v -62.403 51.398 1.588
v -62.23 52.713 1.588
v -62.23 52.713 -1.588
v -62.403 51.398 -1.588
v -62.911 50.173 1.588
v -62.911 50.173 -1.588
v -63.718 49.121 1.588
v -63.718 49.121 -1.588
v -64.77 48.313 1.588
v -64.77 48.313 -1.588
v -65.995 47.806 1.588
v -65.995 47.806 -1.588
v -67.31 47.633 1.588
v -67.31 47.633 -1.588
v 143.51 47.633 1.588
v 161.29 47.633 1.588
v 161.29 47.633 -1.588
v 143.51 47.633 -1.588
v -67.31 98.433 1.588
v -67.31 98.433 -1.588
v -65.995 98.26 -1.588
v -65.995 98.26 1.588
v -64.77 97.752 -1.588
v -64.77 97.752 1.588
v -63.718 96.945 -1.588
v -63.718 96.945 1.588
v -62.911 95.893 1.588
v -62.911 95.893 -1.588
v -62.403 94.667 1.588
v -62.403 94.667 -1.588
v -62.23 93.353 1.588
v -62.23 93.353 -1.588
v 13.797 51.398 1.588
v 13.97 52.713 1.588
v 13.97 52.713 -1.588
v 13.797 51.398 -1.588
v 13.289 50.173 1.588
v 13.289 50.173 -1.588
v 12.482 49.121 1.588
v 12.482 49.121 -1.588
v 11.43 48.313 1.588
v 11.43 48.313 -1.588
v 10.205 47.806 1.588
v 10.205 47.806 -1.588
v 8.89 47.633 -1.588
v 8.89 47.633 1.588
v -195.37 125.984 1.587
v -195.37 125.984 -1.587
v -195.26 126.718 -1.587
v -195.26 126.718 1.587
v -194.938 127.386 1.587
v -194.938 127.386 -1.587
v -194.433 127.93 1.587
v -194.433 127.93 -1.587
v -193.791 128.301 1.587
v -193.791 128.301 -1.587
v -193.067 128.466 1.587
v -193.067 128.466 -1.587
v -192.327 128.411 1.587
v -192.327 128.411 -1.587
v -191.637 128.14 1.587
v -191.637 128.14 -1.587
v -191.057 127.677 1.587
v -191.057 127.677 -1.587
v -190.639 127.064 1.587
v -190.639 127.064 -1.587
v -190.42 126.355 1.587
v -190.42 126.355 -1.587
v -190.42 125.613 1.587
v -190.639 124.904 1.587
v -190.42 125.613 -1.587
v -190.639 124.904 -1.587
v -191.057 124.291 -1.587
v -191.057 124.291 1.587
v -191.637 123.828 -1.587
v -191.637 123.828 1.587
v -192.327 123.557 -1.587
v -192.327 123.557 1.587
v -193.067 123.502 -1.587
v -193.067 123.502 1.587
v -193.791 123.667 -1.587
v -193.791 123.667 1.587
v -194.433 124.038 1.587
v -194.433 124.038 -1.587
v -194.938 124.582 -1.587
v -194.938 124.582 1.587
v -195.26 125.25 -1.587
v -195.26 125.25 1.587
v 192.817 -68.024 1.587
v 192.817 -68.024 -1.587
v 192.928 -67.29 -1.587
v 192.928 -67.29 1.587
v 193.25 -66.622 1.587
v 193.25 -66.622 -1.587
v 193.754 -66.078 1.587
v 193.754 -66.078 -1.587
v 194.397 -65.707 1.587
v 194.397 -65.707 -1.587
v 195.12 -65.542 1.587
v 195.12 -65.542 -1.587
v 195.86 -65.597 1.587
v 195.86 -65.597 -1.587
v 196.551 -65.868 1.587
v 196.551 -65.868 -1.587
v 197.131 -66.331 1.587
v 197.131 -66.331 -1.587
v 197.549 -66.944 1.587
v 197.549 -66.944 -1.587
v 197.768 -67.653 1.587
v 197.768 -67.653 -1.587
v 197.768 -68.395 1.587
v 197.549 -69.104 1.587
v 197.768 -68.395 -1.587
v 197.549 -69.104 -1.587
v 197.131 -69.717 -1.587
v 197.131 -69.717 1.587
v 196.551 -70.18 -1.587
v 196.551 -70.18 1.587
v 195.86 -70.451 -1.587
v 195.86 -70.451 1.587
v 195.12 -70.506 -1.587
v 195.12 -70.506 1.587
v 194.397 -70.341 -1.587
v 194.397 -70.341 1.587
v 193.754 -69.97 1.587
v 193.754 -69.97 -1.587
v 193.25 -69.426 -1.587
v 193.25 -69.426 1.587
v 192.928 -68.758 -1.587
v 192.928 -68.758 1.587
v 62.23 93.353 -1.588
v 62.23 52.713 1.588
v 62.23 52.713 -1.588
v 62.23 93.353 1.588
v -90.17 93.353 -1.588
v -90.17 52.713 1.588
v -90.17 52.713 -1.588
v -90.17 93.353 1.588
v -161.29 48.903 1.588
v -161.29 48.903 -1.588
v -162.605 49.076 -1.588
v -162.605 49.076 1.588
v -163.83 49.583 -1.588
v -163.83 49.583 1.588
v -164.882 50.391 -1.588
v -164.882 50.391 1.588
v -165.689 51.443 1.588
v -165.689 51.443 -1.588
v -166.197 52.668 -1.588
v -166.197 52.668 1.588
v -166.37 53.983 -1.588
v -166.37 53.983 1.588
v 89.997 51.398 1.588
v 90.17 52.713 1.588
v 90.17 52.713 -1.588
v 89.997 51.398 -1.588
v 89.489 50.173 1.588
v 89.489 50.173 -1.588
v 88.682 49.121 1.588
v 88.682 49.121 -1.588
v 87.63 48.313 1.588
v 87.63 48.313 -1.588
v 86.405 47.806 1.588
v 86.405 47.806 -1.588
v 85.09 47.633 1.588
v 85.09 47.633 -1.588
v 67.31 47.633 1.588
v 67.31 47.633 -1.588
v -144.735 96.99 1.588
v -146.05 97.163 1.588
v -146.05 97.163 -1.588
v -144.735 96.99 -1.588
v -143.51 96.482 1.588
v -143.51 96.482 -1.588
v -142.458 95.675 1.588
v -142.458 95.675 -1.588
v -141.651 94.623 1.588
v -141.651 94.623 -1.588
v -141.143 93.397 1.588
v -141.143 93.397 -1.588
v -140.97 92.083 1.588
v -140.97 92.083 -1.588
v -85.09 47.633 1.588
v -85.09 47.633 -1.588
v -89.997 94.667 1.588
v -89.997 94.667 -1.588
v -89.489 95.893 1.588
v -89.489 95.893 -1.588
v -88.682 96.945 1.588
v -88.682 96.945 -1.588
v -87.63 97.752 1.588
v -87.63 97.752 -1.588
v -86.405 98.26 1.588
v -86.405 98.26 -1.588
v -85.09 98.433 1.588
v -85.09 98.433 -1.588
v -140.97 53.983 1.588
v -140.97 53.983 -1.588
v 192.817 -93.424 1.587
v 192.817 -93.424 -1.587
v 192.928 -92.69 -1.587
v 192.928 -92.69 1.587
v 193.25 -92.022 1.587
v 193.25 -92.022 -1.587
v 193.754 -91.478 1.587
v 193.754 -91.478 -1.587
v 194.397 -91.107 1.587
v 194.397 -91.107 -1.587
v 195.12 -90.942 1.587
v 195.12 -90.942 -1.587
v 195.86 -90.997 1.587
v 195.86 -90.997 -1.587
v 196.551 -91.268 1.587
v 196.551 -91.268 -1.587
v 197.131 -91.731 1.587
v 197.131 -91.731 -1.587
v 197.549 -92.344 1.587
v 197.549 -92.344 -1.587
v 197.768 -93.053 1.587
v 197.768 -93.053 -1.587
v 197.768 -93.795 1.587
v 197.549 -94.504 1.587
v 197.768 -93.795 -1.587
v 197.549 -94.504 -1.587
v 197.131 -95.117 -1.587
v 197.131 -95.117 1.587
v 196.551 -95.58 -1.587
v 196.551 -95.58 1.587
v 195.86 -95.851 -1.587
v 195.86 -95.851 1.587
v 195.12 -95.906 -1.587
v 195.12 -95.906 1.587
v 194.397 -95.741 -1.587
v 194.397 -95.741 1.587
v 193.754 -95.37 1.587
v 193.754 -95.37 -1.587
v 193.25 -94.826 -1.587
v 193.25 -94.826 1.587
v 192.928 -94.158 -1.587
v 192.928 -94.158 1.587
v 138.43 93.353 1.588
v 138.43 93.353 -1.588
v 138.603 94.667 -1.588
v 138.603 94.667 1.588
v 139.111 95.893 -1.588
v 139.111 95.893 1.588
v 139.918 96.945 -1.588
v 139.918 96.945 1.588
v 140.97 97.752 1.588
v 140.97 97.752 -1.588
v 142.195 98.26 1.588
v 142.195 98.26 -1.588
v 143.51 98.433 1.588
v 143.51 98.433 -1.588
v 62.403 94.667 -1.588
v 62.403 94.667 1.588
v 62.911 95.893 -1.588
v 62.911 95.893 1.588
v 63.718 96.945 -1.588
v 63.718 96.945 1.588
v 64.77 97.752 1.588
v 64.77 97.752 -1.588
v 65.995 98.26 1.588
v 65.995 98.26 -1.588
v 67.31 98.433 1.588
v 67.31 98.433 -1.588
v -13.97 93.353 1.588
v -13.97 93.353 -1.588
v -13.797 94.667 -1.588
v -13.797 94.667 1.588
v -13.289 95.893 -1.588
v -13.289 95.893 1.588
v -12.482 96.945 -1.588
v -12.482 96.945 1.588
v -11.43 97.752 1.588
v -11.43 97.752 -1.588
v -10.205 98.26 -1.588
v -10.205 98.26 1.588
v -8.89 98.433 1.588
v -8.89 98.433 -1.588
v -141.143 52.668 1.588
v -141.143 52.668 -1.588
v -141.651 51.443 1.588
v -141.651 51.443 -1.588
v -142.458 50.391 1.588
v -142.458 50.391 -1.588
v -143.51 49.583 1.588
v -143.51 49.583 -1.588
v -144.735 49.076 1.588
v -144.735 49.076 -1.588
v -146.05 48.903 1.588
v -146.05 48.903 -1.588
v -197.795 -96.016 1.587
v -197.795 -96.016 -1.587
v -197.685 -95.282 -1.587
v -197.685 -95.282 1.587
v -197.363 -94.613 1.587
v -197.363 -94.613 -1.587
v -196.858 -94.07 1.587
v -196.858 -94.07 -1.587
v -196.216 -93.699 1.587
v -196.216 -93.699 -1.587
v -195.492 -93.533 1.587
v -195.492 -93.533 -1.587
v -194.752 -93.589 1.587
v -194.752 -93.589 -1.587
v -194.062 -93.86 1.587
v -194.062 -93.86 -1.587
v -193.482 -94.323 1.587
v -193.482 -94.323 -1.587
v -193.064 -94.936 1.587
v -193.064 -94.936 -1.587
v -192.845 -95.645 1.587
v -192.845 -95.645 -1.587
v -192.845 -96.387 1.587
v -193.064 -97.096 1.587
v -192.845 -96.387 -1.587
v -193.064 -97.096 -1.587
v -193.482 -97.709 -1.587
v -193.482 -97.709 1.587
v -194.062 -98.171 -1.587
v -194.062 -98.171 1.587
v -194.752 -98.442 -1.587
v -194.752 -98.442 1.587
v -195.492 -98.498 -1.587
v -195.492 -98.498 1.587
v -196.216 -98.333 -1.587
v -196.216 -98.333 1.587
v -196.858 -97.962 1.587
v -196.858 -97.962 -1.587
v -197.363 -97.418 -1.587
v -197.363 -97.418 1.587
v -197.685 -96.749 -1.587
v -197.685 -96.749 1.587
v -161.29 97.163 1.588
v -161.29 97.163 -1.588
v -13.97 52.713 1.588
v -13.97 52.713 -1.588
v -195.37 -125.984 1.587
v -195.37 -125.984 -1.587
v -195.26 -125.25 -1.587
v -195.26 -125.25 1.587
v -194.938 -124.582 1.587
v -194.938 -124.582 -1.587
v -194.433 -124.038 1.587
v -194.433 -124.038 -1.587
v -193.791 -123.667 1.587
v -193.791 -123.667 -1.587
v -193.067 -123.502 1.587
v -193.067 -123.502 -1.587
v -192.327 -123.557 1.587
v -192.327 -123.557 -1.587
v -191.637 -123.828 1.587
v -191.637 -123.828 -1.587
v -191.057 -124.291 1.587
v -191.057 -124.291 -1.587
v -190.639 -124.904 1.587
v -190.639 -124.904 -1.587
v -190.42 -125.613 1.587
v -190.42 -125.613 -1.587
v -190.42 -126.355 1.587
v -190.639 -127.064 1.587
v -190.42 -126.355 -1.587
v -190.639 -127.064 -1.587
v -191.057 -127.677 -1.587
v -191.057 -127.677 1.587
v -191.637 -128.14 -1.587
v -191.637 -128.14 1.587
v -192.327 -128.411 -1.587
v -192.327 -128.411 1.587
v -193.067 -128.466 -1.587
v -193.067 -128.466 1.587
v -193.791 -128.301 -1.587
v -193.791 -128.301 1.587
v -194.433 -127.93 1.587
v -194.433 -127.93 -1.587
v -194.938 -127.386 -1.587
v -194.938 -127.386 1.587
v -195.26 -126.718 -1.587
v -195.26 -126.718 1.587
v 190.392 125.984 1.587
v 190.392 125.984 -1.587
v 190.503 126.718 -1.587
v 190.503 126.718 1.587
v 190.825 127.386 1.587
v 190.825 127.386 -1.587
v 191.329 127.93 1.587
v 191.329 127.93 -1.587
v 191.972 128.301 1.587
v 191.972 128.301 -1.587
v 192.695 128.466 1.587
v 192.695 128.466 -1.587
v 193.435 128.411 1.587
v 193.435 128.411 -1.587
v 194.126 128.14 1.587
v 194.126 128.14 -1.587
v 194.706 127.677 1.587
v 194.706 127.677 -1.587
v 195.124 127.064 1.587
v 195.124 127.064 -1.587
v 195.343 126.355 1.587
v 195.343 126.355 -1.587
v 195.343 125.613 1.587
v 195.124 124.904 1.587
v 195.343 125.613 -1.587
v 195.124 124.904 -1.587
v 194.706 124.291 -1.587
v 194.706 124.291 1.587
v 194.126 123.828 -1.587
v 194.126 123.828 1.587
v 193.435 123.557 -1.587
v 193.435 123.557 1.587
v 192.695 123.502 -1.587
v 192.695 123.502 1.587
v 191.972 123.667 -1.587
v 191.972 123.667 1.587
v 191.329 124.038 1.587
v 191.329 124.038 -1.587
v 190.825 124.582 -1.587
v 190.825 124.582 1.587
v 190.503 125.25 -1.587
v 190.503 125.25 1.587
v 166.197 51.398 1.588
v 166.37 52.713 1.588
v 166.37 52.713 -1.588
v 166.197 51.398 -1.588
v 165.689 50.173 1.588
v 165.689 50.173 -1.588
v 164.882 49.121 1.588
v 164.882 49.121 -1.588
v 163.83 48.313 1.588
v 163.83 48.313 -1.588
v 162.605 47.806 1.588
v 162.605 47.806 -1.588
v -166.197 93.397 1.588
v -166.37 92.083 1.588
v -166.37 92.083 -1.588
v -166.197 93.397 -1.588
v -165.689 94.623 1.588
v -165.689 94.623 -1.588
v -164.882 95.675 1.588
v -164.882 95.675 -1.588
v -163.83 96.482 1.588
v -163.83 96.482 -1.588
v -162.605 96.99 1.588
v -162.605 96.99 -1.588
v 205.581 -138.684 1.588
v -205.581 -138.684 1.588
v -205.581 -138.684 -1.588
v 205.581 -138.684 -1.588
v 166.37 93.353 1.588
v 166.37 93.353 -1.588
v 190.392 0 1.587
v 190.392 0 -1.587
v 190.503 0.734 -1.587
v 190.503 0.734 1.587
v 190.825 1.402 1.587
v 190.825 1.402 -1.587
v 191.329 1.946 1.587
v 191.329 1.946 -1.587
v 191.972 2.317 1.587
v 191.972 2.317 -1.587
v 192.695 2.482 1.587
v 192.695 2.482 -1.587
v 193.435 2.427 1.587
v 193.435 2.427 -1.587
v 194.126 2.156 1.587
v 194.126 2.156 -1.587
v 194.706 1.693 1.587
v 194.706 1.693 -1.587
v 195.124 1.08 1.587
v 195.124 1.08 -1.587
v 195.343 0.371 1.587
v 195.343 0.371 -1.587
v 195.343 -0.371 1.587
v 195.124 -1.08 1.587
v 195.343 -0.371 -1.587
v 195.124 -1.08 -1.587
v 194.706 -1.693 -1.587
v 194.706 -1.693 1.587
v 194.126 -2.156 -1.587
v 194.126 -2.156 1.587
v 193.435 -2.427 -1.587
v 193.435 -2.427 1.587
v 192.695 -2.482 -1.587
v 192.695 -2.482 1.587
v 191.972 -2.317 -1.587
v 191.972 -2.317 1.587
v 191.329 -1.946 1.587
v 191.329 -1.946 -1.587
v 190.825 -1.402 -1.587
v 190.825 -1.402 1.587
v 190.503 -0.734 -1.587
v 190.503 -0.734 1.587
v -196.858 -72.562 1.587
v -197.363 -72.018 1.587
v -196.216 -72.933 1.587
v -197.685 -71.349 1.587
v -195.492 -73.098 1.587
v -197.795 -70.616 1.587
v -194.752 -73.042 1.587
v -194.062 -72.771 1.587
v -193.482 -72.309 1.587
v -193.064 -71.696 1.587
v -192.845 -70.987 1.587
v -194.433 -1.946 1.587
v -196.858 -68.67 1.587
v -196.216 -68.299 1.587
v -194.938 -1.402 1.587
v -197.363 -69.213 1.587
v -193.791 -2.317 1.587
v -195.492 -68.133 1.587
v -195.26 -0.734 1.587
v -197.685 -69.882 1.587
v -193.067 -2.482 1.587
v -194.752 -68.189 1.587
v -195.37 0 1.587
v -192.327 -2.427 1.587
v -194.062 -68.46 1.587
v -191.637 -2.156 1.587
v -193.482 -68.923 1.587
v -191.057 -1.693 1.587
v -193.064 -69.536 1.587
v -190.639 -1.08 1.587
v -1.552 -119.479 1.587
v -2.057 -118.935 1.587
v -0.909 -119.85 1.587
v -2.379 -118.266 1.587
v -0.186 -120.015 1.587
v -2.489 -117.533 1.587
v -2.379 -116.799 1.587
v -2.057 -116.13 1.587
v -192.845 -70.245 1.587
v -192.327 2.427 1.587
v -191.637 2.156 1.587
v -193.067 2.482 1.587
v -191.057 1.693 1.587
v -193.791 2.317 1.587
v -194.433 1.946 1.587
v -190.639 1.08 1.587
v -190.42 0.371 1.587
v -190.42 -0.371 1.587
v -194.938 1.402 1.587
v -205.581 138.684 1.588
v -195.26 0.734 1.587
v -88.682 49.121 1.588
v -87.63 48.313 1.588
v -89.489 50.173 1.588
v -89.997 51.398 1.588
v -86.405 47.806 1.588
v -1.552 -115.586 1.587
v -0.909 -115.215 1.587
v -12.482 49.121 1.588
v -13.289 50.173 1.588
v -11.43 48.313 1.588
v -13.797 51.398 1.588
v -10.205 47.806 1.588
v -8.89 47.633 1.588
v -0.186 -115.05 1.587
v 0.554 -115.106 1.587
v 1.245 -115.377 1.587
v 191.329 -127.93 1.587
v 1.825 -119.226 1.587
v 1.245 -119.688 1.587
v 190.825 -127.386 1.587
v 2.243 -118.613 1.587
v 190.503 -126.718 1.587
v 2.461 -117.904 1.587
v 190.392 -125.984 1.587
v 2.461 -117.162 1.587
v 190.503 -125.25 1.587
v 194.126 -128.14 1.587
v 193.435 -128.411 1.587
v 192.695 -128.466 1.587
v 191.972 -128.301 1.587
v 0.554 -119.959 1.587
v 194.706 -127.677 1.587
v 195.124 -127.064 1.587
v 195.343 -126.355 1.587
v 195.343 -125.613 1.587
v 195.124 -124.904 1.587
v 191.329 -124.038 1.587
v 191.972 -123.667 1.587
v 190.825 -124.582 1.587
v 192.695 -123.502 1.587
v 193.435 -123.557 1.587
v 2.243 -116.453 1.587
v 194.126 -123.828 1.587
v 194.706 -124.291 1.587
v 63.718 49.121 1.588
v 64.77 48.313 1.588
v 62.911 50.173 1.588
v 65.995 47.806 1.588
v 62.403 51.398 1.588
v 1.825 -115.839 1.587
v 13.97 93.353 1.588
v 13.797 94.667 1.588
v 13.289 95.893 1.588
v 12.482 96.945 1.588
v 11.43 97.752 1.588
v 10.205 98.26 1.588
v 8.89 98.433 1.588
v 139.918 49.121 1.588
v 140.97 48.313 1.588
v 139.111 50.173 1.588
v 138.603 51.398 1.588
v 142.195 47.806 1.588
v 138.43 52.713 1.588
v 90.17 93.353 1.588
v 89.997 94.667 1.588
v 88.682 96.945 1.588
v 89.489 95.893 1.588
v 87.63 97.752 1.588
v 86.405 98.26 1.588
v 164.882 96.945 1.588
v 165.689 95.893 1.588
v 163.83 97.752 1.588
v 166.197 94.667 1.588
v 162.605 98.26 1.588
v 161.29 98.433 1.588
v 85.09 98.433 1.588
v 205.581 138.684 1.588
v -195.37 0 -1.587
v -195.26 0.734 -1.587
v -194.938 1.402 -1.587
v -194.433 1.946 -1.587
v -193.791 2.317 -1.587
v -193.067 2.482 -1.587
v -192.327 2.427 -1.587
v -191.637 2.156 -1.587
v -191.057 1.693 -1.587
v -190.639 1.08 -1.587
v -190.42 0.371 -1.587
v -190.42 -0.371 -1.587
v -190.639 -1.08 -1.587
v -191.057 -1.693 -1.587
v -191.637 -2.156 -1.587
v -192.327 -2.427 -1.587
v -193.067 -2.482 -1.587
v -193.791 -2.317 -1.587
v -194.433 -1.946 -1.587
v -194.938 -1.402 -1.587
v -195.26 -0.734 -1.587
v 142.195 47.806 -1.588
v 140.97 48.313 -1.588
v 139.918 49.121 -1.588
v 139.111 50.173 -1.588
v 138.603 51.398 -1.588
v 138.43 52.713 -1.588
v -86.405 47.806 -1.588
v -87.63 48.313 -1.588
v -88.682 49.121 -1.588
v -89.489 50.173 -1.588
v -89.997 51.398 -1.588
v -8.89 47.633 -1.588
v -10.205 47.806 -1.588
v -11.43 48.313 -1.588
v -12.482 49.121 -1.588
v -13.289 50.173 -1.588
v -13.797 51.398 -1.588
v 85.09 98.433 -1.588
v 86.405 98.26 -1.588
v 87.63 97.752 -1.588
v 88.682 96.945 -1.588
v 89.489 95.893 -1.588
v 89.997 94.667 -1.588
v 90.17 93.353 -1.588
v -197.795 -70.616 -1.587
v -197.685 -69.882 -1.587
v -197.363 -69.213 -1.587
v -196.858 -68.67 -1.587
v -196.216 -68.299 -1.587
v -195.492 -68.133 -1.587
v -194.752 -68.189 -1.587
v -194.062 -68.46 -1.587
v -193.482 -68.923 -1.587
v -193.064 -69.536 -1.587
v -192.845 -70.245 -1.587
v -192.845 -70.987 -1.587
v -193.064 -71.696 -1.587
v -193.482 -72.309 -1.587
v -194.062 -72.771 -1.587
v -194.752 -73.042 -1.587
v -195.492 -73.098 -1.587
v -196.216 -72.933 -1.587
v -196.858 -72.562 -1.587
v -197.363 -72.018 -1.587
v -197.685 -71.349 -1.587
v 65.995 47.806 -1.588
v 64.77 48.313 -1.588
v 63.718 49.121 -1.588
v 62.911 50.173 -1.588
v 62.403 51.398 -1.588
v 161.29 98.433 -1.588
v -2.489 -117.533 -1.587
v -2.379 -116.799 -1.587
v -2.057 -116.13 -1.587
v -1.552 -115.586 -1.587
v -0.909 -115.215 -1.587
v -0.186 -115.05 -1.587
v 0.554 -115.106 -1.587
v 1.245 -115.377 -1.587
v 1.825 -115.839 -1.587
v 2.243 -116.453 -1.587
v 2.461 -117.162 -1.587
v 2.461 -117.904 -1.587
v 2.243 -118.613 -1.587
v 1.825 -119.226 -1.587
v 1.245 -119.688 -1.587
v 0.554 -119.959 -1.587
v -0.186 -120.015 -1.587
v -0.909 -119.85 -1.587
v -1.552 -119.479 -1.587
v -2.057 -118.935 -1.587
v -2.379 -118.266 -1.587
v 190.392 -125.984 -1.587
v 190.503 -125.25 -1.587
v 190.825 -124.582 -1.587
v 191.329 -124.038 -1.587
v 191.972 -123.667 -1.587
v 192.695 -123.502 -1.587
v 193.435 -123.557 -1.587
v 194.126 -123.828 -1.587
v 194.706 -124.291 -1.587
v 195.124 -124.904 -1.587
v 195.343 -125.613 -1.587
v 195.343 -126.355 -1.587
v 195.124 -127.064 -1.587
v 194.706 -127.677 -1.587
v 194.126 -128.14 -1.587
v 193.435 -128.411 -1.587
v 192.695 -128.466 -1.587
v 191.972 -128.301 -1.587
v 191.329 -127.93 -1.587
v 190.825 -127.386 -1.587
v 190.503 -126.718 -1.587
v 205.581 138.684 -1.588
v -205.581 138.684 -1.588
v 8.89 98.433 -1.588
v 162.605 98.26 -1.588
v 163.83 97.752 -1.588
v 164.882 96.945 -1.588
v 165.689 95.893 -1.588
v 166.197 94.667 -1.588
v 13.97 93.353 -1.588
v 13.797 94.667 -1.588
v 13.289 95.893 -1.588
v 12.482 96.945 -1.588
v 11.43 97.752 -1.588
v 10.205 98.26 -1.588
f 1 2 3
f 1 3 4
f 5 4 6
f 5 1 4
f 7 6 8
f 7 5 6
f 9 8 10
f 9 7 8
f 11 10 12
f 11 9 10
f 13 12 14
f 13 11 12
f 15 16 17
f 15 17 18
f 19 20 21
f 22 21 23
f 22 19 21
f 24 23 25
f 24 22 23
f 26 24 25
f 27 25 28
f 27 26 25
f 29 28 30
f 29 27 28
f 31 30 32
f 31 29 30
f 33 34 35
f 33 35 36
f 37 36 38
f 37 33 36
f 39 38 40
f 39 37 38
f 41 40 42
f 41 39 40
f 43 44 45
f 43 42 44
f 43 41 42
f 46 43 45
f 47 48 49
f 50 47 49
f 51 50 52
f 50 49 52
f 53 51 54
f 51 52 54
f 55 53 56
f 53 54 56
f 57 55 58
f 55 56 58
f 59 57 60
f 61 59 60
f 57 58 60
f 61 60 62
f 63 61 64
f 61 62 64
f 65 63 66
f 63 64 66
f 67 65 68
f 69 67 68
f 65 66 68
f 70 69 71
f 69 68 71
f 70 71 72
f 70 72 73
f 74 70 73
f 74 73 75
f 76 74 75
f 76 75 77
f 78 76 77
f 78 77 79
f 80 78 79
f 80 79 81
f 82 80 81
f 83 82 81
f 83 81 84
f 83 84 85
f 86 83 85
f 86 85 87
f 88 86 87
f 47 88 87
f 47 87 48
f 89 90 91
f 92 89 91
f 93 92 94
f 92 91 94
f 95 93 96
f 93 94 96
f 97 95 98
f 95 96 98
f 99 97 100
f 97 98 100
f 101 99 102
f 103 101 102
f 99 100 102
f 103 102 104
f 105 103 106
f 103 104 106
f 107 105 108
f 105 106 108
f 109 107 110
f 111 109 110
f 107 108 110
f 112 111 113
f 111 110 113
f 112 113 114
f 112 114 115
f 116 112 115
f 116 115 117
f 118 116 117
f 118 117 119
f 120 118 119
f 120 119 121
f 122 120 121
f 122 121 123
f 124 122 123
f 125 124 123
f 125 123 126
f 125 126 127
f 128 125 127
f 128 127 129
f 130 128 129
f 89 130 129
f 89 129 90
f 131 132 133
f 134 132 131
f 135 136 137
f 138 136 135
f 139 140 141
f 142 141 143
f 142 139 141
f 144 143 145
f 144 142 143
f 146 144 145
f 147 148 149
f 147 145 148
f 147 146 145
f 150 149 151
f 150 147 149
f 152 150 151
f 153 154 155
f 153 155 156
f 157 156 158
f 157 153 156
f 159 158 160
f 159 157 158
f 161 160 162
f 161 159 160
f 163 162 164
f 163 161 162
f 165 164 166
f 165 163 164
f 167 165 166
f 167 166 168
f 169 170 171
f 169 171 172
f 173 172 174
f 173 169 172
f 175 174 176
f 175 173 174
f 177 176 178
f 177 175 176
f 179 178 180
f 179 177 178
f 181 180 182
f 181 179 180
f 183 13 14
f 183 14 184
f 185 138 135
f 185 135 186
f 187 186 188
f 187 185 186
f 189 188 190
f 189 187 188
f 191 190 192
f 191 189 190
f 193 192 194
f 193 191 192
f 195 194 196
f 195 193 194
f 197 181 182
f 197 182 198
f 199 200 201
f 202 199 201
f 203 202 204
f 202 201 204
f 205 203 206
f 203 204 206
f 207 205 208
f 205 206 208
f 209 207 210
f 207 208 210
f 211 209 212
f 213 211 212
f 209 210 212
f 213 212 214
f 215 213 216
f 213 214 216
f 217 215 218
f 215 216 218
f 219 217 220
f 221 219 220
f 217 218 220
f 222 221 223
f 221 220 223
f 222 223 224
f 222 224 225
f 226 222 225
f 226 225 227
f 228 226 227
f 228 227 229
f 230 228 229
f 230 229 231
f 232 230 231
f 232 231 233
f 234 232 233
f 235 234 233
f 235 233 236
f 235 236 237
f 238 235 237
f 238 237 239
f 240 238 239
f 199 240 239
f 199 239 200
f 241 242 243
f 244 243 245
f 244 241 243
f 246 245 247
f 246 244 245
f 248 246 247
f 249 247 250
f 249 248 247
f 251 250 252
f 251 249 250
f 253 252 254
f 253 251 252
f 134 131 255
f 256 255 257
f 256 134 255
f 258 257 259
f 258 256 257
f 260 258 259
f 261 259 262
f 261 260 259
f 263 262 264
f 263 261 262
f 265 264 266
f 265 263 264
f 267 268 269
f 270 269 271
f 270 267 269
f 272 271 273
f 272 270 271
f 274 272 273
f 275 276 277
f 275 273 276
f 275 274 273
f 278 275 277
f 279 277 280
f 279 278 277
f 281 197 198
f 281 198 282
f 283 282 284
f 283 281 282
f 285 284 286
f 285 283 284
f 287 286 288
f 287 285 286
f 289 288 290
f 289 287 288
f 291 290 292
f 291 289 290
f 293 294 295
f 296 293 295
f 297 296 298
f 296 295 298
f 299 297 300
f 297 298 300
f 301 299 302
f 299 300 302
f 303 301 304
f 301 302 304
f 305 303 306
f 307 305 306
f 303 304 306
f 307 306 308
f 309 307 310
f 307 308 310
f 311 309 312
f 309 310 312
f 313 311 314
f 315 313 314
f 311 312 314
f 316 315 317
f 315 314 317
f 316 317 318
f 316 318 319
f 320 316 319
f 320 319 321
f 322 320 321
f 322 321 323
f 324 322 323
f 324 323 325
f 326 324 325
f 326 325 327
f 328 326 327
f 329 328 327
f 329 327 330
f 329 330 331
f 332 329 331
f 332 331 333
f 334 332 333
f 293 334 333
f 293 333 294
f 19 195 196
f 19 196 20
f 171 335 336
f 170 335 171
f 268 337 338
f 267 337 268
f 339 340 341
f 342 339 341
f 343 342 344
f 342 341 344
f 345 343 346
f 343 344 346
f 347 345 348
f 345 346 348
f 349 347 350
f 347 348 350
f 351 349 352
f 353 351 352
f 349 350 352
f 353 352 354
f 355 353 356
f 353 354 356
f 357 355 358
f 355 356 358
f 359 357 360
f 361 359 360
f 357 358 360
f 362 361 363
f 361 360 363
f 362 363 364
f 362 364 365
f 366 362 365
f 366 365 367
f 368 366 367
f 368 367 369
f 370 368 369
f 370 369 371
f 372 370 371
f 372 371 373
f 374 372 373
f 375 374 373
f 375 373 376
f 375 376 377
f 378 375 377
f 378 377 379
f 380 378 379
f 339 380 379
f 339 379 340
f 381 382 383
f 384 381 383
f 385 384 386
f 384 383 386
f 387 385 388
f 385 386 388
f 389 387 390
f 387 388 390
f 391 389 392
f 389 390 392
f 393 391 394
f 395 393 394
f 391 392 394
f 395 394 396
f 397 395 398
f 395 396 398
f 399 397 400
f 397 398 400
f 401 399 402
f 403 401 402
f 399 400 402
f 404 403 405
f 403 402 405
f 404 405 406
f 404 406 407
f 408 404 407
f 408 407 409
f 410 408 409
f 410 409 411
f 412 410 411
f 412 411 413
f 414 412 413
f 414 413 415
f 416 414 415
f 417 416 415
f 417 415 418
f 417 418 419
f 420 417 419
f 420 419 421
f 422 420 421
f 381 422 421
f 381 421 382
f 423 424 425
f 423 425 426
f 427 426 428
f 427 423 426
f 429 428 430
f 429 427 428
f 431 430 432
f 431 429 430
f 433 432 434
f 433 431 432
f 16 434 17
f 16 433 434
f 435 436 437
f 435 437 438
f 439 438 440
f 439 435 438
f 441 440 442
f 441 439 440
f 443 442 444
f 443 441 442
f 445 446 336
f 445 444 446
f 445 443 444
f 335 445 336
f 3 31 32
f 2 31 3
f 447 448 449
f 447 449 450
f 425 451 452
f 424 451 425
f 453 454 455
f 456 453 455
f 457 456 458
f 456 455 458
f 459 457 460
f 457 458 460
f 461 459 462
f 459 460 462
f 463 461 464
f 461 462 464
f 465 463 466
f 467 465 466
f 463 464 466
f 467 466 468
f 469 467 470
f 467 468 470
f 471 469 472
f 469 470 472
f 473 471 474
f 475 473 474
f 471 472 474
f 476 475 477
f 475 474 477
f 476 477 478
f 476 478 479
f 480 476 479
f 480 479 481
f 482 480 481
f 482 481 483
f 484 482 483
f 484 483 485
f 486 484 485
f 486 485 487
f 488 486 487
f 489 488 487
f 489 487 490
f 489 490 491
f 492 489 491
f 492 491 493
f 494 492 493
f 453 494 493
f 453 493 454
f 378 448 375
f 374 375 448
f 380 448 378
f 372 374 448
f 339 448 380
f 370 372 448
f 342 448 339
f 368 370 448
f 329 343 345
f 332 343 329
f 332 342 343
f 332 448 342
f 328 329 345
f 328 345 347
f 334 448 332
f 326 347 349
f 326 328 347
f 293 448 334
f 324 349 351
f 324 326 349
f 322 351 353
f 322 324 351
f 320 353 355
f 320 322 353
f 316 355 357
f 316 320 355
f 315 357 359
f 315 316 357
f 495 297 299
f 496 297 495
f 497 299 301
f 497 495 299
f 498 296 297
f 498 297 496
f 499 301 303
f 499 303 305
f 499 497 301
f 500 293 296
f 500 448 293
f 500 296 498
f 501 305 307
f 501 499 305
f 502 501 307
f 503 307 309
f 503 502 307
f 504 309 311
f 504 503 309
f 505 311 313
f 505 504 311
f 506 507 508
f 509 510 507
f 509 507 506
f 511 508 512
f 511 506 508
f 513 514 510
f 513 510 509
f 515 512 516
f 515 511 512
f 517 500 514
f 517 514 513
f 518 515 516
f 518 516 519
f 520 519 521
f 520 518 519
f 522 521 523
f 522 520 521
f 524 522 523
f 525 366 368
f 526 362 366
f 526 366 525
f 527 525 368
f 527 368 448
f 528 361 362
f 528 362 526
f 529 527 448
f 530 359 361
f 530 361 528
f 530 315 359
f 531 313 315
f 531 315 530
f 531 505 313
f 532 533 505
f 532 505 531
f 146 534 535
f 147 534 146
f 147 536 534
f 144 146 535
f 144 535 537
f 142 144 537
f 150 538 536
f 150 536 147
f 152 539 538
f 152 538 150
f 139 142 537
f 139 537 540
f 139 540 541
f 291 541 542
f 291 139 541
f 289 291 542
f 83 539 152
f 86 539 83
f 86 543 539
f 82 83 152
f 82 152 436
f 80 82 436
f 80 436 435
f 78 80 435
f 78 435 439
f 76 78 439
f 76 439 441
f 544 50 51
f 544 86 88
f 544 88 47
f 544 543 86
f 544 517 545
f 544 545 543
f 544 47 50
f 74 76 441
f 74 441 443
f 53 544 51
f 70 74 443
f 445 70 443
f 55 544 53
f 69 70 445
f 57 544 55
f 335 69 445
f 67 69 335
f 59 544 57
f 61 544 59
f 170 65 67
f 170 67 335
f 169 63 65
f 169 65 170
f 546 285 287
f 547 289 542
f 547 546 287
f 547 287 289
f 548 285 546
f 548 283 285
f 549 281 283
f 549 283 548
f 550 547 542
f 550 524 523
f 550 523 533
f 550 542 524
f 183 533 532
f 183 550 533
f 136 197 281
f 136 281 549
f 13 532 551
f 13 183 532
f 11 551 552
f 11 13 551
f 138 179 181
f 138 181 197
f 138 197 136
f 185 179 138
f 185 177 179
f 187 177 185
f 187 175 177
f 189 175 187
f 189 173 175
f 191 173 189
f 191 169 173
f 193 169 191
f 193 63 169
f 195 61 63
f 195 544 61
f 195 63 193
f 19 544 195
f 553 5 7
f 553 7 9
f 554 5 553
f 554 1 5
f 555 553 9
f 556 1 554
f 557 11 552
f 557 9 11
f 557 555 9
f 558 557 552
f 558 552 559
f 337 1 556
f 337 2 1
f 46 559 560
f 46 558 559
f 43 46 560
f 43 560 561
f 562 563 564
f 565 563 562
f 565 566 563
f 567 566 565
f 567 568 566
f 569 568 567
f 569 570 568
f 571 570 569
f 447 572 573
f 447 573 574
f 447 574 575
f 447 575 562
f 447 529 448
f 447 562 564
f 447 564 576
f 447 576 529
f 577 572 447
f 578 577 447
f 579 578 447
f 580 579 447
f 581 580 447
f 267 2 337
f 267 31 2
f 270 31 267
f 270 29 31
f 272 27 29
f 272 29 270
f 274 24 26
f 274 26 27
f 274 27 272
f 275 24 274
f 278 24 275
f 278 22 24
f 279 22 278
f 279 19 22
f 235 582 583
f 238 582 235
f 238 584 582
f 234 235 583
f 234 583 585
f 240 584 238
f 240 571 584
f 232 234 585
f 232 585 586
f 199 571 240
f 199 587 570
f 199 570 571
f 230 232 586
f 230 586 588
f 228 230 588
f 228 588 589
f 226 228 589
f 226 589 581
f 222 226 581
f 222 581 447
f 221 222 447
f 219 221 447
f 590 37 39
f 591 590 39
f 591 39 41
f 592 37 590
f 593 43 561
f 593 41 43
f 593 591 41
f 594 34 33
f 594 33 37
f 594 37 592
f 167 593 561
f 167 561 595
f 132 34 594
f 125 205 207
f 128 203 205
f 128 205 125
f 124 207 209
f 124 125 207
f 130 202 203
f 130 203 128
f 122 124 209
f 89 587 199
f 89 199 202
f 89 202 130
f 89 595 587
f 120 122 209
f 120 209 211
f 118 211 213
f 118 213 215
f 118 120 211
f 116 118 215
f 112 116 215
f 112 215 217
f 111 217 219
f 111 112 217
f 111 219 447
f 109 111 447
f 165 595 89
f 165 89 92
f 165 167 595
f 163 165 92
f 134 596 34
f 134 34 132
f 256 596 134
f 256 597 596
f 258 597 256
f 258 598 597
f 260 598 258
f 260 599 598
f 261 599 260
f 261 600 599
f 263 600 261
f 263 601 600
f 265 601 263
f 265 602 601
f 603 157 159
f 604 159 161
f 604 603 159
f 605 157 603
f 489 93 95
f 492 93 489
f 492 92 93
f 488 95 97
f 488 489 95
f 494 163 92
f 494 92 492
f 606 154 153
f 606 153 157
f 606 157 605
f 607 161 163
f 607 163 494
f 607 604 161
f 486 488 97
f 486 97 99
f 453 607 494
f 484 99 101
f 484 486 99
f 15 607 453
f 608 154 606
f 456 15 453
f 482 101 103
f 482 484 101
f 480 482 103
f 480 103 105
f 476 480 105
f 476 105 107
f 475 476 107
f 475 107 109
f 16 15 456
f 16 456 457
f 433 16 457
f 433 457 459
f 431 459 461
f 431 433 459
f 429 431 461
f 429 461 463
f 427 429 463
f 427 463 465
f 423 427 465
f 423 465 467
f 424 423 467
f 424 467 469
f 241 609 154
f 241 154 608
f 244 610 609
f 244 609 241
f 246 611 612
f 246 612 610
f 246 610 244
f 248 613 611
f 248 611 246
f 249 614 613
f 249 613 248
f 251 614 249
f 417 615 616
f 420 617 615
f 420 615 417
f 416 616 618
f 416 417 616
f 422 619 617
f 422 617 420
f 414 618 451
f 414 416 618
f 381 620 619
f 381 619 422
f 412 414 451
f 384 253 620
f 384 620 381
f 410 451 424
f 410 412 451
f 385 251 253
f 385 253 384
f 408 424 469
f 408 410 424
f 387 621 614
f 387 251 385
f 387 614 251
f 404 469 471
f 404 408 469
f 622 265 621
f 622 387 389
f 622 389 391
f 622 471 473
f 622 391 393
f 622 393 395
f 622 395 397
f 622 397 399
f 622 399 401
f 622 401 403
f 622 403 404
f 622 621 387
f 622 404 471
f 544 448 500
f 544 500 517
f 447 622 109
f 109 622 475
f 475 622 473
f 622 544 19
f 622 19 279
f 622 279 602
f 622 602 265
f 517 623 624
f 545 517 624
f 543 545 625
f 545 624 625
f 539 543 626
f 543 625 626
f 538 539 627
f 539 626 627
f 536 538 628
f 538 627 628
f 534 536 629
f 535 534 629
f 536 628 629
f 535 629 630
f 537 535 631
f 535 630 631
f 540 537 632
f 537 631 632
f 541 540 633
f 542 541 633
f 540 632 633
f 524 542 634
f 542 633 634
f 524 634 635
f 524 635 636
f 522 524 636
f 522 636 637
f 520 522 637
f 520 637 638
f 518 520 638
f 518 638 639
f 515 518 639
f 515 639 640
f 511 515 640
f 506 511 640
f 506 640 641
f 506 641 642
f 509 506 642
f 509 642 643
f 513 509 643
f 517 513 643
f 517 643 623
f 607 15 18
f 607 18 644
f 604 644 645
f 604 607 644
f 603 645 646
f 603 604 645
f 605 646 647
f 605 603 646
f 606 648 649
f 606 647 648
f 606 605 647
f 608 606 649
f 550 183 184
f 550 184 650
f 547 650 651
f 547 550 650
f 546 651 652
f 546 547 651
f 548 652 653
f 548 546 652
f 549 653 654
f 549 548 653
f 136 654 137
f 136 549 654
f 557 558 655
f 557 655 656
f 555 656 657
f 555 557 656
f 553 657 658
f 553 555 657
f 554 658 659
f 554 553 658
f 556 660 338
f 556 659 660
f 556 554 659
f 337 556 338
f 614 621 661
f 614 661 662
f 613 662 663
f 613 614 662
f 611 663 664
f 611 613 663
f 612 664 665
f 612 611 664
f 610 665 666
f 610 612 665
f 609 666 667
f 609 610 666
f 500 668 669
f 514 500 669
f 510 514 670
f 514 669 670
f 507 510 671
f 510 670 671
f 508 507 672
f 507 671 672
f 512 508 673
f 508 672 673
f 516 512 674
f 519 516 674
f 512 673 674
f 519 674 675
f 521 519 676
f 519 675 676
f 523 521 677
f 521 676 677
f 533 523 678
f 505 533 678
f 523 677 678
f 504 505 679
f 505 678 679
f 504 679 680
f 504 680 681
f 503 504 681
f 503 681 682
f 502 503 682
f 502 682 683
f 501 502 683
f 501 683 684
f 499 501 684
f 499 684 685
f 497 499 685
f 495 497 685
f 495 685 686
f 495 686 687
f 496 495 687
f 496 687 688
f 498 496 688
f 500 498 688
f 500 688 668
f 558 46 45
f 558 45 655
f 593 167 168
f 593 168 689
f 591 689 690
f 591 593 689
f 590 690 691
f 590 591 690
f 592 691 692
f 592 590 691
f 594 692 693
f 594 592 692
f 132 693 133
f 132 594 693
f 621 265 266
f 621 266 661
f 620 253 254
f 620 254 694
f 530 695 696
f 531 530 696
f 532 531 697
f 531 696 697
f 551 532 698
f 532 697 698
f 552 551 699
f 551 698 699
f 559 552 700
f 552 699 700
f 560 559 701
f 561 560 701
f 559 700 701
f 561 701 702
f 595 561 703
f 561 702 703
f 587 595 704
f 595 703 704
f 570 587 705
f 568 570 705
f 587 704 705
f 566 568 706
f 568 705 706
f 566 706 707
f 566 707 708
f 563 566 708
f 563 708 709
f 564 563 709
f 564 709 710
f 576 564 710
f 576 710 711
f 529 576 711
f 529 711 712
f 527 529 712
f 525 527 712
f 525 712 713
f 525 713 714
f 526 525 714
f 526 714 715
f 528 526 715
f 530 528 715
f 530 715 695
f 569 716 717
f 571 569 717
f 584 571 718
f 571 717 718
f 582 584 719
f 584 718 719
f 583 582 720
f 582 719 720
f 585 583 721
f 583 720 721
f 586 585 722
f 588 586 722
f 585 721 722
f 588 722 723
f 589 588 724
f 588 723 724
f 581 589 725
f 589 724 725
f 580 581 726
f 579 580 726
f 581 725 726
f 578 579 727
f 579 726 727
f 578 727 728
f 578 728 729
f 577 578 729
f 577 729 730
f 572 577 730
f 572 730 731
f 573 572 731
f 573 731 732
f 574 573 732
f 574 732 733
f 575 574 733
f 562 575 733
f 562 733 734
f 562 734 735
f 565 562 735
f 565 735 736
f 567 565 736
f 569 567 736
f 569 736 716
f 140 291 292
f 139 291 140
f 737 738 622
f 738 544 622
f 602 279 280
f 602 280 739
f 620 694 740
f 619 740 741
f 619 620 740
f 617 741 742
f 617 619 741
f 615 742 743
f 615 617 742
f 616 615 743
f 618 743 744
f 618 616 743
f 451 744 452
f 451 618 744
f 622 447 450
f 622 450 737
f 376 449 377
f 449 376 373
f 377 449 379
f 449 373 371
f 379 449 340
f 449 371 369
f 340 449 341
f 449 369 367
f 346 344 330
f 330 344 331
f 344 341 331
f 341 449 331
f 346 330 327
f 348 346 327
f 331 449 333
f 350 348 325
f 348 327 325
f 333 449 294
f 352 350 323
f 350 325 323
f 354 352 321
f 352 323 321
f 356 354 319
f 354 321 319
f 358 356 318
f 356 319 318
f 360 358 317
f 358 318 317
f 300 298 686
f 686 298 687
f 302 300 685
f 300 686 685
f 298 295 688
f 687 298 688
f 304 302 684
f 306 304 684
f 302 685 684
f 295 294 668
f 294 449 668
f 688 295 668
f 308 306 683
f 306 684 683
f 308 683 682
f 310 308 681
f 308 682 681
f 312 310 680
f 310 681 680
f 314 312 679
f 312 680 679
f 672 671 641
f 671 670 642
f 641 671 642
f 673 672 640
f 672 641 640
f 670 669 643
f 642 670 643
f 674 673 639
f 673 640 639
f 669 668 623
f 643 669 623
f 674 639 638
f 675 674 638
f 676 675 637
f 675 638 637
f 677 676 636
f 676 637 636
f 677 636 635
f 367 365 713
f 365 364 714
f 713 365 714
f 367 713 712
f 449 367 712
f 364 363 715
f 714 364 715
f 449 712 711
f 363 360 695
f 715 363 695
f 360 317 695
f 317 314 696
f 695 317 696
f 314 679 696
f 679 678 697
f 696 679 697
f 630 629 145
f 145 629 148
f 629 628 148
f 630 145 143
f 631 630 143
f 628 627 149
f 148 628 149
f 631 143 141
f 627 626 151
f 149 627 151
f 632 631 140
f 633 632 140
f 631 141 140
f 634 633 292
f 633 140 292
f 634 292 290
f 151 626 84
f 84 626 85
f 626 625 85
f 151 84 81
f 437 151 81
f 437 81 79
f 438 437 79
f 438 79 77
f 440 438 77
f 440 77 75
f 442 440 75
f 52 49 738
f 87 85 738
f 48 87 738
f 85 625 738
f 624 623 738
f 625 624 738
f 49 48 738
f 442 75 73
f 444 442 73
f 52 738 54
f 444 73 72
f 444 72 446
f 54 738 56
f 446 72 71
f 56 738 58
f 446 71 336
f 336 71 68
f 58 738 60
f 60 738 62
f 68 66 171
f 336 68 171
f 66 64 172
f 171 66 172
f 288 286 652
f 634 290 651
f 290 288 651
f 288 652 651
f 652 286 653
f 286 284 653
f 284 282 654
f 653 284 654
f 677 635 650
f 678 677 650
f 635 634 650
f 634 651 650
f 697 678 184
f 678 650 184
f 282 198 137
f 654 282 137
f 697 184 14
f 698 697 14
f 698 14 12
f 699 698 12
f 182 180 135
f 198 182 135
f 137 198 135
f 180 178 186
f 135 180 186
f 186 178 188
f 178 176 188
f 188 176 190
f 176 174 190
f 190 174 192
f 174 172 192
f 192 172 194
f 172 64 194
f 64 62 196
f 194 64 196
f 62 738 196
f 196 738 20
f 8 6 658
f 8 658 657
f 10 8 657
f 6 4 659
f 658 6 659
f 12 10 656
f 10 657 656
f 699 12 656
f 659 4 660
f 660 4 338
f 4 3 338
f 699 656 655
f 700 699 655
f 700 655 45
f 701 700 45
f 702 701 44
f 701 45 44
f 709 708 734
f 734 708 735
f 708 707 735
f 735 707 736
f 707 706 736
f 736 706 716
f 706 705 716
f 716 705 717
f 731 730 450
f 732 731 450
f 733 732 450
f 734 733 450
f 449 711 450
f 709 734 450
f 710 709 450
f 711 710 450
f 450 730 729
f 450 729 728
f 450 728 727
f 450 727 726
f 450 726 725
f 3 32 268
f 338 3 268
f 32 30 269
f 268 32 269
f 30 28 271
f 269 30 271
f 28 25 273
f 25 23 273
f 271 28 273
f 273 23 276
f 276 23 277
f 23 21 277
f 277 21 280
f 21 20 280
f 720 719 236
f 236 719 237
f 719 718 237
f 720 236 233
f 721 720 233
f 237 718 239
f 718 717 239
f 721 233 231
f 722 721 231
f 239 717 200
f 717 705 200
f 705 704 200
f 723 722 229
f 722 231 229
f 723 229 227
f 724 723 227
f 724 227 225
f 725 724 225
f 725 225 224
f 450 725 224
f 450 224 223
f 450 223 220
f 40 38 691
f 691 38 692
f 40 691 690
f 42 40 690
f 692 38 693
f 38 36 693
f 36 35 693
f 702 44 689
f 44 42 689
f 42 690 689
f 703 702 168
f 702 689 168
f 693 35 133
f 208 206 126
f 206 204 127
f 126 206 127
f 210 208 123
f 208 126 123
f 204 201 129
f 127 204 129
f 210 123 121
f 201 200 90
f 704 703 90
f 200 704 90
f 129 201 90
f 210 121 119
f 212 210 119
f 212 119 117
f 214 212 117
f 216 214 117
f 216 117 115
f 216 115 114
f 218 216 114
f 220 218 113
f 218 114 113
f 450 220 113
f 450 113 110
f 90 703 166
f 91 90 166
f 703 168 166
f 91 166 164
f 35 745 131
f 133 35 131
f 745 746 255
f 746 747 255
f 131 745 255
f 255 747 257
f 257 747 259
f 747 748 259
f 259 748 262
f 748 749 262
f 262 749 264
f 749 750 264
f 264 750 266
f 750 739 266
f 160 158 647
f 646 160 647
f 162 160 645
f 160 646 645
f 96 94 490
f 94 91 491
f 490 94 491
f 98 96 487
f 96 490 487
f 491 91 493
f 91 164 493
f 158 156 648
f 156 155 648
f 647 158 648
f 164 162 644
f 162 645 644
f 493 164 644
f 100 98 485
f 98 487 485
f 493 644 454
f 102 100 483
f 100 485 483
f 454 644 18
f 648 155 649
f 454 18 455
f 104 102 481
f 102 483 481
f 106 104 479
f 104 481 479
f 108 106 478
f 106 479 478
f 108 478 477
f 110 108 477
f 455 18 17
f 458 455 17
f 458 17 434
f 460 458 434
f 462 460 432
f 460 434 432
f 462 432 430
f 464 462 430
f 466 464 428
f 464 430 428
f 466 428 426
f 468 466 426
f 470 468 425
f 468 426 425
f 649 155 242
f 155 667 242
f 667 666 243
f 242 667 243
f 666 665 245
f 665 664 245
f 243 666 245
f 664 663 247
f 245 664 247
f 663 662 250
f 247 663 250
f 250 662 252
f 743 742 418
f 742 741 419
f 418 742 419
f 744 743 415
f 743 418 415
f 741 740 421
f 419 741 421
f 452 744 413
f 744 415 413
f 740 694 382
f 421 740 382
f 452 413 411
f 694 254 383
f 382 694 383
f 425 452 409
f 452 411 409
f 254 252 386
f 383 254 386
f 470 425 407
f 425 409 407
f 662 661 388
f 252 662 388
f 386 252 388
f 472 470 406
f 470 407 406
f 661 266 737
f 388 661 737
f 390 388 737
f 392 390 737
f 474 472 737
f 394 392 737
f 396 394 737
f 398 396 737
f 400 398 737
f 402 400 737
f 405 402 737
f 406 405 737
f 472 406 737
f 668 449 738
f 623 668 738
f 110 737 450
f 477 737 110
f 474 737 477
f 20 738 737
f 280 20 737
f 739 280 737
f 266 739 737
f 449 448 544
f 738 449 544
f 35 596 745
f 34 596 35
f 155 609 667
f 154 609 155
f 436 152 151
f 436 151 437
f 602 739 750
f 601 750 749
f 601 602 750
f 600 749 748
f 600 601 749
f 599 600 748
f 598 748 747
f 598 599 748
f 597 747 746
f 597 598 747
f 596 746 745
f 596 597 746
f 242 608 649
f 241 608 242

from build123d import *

# Parameters (mm, degrees)
SKETCH3_W              = 411.1625
SKETCH3_H              = 277.368
BOSS_EXTRUDE1_DEPTH    = 1.5875
CUT_EXTRUDE1_DEPTH     = 25.4
F_10_CLEARANCE_HOLE1_D = 4.9784
F_10_CLEARANCE_HOLE2_D = 4.9784
F_10_CLEARANCE_HOLE3_D = 4.9784
F_10_CLEARANCE_HOLE4_D = 4.9784
F_10_CLEARANCE_HOLE5_D = 4.9784


with BuildPart() as part:
    # Sketch3 → Boss-Extrude1 (new, symmetric)
    with BuildSketch(Plane.XY):
        Rectangle(SKETCH3_W, SKETCH3_H)
    extrude(amount=BOSS_EXTRUDE1_DEPTH, both=True)

    # Sketch4 → Cut-Extrude1 (cut)
    with BuildSketch(Plane.XY.offset(1.5875)):
        with BuildLine():
            Line((-8.89, 98.4326708), (8.89, 98.4326708))
            ThreePointArc((8.89, 98.4326708), (12.482102448, 96.944773248), (13.97, 93.3526708))
            Line((13.97, 93.3526708), (13.97, 52.7126708))
            ThreePointArc((13.97, 52.7126708), (12.482102448, 49.120568352), (8.89, 47.6326708))
            Line((8.89, 47.6326708), (-8.89, 47.6326708))
            ThreePointArc((-8.89, 47.6326708), (-12.482102448, 49.120568352), (-13.97, 52.7126708))
            Line((-13.97, 52.7126708), (-13.97, 93.3526708))
            ThreePointArc((-13.97, 93.3526708), (-12.482102448, 96.944773248), (-8.89, 98.4326708))
        make_face()
        with BuildLine():
            Line((67.31, 98.4326708), (85.09, 98.4326708))
            ThreePointArc((85.09, 98.4326708), (88.682102448, 96.944773248), (90.17, 93.3526708))
            Line((90.17, 93.3526708), (90.17, 52.7126708))
            ThreePointArc((90.17, 52.7126708), (88.682102448, 49.120568352), (85.09, 47.6326708))
            Line((85.09, 47.6326708), (67.31, 47.6326708))
            ThreePointArc((67.31, 47.6326708), (63.717897552, 49.120568352), (62.23, 52.7126708))
            Line((62.23, 52.7126708), (62.23, 93.3526708))
            ThreePointArc((62.23, 93.3526708), (63.717897552, 96.944773248), (67.31, 98.4326708))
        make_face()
        with BuildLine():
            Line((143.51, 98.4326708), (161.29, 98.4326708))
            ThreePointArc((161.29, 98.4326708), (164.882102448, 96.944773248), (166.37, 93.3526708))
            Line((166.37, 93.3526708), (166.37, 52.7126708))
            ThreePointArc((166.37, 52.7126708), (164.882102448, 49.120568352), (161.29, 47.6326708))
            Line((161.29, 47.6326708), (143.51, 47.6326708))
            ThreePointArc((143.51, 47.6326708), (139.917897552, 49.120568352), (138.43, 52.7126708))
            Line((138.43, 52.7126708), (138.43, 93.3526708))
            ThreePointArc((138.43, 93.3526708), (139.917897552, 96.944773248), (143.51, 98.4326708))
        make_face()
        with BuildLine():
            Line((-85.09, 98.4326708), (-67.31, 98.4326708))
            ThreePointArc((-67.31, 98.4326708), (-63.717897552, 96.944773248), (-62.23, 93.3526708))
            Line((-62.23, 93.3526708), (-62.23, 52.7126708))
            ThreePointArc((-62.23, 52.7126708), (-63.717897552, 49.120568352), (-67.31, 47.6326708))
            Line((-67.31, 47.6326708), (-85.09, 47.6326708))
            ThreePointArc((-85.09, 47.6326708), (-88.682102448, 49.120568352), (-90.17, 52.7126708))
            Line((-90.17, 52.7126708), (-90.17, 93.3526708))
            ThreePointArc((-90.17, 93.3526708), (-88.682102448, 96.944773248), (-85.09, 98.4326708))
        make_face()
        with BuildLine():
            Line((-161.29, 97.1626708), (-146.05, 97.1626708))
            ThreePointArc((-146.05, 97.1626708), (-142.457897552, 95.674773248), (-140.97, 92.0826708))
            Line((-140.97, 92.0826708), (-140.97, 53.9826708))
            ThreePointArc((-140.97, 53.9826708), (-142.457897552, 50.390568352), (-146.05, 48.9026708))
            Line((-146.05, 48.9026708), (-161.29, 48.9026708))
            ThreePointArc((-161.29, 48.9026708), (-164.882102448, 50.390568352), (-166.37, 53.9826708))
            Line((-166.37, 53.9826708), (-166.37, 92.0826708))
            ThreePointArc((-166.37, 92.0826708), (-164.882102448, 95.674773248), (-161.29, 97.1626708))
        make_face()
    extrude(amount=-CUT_EXTRUDE1_DEPTH, mode=Mode.SUBTRACT)

    # #10 Clearance Hole1 (through all)
    with Locations(Plane.XY.offset(1.5875)):
        with Locations((192.88125, 125.984), (-192.88125, -125.984), (192.88125, -125.984), (-192.88125, 125.984), (-192.88125, 0), (192.88125, 0)):
            Hole(F_10_CLEARANCE_HOLE1_D / 2)

    # #10 Clearance Hole2 (through all)
    with Locations(Plane.XY.offset(1.5875)):
        with Locations((0, -117.532545274)):
            Hole(F_10_CLEARANCE_HOLE2_D / 2)

    # #10 Clearance Hole3 (through all)
    with Locations(Plane.XY.offset(1.5875)):
        with Locations((-195.30625, -70.615668917)):
            Hole(F_10_CLEARANCE_HOLE3_D / 2)

    # #10 Clearance Hole4 (through all)
    with Locations(Plane.XY.offset(1.5875)):
        with Locations((-195.30625, -96.015668917)):
            Hole(F_10_CLEARANCE_HOLE4_D / 2)

    # #10 Clearance Hole5 (through all)
    with Locations(Plane.XY.offset(1.5875)):
        with Locations((195.30625, -68.024189157), (195.30625, -93.424189157)):
            Hole(F_10_CLEARANCE_HOLE5_D / 2)


solid = part.part
